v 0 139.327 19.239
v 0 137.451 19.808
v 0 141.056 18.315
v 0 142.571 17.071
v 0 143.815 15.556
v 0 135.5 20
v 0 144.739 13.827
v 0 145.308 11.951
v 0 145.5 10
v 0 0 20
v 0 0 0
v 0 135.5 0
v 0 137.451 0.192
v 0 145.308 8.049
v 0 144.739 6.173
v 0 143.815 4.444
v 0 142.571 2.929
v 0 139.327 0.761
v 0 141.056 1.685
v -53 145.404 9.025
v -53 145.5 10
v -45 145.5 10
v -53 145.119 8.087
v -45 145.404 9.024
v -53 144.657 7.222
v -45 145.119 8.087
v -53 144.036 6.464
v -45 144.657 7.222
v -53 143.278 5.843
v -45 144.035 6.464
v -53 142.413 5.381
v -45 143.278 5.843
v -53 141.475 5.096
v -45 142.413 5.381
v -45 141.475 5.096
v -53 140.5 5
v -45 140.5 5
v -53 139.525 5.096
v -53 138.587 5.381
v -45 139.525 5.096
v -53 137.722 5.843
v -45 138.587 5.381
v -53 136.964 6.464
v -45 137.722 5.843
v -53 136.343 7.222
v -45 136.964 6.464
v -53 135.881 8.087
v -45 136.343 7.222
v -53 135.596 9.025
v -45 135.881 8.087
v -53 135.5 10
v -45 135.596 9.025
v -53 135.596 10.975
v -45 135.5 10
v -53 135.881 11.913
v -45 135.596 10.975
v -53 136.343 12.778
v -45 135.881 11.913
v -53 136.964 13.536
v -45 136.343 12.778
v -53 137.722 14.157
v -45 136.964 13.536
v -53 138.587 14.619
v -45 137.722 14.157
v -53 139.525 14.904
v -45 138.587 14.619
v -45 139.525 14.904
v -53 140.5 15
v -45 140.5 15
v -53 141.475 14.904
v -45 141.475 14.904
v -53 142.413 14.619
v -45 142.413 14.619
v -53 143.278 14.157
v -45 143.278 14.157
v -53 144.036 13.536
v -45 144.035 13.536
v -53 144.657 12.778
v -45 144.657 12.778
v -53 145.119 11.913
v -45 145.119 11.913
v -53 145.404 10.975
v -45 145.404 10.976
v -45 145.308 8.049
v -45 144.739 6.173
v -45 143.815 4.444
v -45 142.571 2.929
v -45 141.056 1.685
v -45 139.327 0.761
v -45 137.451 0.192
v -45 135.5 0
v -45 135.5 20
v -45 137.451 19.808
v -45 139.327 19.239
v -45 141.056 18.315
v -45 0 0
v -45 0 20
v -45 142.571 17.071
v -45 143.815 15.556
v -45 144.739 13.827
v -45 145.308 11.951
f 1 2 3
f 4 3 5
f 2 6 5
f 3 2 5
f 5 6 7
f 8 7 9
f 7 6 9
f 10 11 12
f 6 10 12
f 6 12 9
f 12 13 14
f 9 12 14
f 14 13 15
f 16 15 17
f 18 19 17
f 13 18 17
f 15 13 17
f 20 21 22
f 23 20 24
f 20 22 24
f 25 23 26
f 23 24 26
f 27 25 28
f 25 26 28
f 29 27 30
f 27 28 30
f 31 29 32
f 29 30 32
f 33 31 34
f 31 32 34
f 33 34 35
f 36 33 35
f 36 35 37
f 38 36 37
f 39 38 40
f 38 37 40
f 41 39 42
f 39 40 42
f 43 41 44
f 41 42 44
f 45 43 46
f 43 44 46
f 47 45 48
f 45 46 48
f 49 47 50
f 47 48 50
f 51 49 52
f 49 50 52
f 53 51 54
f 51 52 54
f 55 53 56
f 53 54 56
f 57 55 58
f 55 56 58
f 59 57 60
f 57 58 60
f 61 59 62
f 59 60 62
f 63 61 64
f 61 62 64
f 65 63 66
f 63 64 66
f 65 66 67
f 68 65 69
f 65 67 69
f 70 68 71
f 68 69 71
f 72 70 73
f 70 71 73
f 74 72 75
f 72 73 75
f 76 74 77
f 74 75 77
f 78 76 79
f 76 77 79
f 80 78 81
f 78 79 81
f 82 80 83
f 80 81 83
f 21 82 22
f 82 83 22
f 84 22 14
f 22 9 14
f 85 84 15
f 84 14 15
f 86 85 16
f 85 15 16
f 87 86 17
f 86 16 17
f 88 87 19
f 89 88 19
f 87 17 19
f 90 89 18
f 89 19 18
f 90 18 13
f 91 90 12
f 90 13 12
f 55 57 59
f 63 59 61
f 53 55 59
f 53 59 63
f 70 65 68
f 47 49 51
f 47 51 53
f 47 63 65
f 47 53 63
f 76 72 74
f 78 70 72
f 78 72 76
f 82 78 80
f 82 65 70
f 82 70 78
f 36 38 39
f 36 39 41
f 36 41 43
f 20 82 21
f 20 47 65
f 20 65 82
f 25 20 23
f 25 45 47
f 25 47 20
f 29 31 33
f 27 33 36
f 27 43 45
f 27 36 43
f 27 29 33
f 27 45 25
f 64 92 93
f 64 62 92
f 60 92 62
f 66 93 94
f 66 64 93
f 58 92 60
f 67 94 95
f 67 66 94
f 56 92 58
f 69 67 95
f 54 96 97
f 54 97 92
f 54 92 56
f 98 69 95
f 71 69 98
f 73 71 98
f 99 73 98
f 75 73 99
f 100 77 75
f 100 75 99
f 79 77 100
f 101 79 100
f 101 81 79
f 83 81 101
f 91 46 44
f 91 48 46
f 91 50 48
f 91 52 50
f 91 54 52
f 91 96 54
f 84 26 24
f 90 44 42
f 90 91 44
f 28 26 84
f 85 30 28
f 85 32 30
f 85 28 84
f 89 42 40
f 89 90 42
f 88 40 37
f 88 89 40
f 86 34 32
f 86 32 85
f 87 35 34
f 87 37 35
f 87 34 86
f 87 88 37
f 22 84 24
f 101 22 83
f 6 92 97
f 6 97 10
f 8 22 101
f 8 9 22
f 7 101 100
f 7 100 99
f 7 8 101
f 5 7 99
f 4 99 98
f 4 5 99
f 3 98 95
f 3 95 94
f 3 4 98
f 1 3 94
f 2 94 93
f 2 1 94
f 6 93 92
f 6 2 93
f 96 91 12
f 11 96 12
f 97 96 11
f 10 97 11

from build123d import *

# Parameters (mm, degrees)
CROQUIS1_W              = 45
CROQUIS1_H              = 145.5
SALIENTE_EXTRUIR1_DEPTH = 20
REDONDEO1_R             = 10
CROQUIS2_R              = 5
SALIENTE_EXTRUIR2_DEPTH = 8


with BuildPart() as part:
    # Croquis1 → Saliente-Extruir1 (new body)
    with BuildSketch(Plane.XY):
        with Locations((-22.5, 72.75)):
            Rectangle(CROQUIS1_W, CROQUIS1_H)
    extrude(amount=SALIENTE_EXTRUIR1_DEPTH)

    # Redondeo1
    redondeo1_edges = [part.edges().sort_by_distance(p)[0] for p in [
        (-22.5, 145.5, 0),
        (-22.5, 145.5, 20),
    ]]
    fillet(redondeo1_edges, radius=REDONDEO1_R - 0.0001)  # a hair under: the kernel refuses the full size

    # Croquis2 → Saliente-Extruir2 (add)
    with BuildSketch(Plane.ZY.offset(45)):
        with Locations(Location((10, 140.5, 0), (0, 0, 89.99948753))):
            Circle(CROQUIS2_R)
    extrude(amount=SALIENTE_EXTRUIR2_DEPTH)


solid = part.part
